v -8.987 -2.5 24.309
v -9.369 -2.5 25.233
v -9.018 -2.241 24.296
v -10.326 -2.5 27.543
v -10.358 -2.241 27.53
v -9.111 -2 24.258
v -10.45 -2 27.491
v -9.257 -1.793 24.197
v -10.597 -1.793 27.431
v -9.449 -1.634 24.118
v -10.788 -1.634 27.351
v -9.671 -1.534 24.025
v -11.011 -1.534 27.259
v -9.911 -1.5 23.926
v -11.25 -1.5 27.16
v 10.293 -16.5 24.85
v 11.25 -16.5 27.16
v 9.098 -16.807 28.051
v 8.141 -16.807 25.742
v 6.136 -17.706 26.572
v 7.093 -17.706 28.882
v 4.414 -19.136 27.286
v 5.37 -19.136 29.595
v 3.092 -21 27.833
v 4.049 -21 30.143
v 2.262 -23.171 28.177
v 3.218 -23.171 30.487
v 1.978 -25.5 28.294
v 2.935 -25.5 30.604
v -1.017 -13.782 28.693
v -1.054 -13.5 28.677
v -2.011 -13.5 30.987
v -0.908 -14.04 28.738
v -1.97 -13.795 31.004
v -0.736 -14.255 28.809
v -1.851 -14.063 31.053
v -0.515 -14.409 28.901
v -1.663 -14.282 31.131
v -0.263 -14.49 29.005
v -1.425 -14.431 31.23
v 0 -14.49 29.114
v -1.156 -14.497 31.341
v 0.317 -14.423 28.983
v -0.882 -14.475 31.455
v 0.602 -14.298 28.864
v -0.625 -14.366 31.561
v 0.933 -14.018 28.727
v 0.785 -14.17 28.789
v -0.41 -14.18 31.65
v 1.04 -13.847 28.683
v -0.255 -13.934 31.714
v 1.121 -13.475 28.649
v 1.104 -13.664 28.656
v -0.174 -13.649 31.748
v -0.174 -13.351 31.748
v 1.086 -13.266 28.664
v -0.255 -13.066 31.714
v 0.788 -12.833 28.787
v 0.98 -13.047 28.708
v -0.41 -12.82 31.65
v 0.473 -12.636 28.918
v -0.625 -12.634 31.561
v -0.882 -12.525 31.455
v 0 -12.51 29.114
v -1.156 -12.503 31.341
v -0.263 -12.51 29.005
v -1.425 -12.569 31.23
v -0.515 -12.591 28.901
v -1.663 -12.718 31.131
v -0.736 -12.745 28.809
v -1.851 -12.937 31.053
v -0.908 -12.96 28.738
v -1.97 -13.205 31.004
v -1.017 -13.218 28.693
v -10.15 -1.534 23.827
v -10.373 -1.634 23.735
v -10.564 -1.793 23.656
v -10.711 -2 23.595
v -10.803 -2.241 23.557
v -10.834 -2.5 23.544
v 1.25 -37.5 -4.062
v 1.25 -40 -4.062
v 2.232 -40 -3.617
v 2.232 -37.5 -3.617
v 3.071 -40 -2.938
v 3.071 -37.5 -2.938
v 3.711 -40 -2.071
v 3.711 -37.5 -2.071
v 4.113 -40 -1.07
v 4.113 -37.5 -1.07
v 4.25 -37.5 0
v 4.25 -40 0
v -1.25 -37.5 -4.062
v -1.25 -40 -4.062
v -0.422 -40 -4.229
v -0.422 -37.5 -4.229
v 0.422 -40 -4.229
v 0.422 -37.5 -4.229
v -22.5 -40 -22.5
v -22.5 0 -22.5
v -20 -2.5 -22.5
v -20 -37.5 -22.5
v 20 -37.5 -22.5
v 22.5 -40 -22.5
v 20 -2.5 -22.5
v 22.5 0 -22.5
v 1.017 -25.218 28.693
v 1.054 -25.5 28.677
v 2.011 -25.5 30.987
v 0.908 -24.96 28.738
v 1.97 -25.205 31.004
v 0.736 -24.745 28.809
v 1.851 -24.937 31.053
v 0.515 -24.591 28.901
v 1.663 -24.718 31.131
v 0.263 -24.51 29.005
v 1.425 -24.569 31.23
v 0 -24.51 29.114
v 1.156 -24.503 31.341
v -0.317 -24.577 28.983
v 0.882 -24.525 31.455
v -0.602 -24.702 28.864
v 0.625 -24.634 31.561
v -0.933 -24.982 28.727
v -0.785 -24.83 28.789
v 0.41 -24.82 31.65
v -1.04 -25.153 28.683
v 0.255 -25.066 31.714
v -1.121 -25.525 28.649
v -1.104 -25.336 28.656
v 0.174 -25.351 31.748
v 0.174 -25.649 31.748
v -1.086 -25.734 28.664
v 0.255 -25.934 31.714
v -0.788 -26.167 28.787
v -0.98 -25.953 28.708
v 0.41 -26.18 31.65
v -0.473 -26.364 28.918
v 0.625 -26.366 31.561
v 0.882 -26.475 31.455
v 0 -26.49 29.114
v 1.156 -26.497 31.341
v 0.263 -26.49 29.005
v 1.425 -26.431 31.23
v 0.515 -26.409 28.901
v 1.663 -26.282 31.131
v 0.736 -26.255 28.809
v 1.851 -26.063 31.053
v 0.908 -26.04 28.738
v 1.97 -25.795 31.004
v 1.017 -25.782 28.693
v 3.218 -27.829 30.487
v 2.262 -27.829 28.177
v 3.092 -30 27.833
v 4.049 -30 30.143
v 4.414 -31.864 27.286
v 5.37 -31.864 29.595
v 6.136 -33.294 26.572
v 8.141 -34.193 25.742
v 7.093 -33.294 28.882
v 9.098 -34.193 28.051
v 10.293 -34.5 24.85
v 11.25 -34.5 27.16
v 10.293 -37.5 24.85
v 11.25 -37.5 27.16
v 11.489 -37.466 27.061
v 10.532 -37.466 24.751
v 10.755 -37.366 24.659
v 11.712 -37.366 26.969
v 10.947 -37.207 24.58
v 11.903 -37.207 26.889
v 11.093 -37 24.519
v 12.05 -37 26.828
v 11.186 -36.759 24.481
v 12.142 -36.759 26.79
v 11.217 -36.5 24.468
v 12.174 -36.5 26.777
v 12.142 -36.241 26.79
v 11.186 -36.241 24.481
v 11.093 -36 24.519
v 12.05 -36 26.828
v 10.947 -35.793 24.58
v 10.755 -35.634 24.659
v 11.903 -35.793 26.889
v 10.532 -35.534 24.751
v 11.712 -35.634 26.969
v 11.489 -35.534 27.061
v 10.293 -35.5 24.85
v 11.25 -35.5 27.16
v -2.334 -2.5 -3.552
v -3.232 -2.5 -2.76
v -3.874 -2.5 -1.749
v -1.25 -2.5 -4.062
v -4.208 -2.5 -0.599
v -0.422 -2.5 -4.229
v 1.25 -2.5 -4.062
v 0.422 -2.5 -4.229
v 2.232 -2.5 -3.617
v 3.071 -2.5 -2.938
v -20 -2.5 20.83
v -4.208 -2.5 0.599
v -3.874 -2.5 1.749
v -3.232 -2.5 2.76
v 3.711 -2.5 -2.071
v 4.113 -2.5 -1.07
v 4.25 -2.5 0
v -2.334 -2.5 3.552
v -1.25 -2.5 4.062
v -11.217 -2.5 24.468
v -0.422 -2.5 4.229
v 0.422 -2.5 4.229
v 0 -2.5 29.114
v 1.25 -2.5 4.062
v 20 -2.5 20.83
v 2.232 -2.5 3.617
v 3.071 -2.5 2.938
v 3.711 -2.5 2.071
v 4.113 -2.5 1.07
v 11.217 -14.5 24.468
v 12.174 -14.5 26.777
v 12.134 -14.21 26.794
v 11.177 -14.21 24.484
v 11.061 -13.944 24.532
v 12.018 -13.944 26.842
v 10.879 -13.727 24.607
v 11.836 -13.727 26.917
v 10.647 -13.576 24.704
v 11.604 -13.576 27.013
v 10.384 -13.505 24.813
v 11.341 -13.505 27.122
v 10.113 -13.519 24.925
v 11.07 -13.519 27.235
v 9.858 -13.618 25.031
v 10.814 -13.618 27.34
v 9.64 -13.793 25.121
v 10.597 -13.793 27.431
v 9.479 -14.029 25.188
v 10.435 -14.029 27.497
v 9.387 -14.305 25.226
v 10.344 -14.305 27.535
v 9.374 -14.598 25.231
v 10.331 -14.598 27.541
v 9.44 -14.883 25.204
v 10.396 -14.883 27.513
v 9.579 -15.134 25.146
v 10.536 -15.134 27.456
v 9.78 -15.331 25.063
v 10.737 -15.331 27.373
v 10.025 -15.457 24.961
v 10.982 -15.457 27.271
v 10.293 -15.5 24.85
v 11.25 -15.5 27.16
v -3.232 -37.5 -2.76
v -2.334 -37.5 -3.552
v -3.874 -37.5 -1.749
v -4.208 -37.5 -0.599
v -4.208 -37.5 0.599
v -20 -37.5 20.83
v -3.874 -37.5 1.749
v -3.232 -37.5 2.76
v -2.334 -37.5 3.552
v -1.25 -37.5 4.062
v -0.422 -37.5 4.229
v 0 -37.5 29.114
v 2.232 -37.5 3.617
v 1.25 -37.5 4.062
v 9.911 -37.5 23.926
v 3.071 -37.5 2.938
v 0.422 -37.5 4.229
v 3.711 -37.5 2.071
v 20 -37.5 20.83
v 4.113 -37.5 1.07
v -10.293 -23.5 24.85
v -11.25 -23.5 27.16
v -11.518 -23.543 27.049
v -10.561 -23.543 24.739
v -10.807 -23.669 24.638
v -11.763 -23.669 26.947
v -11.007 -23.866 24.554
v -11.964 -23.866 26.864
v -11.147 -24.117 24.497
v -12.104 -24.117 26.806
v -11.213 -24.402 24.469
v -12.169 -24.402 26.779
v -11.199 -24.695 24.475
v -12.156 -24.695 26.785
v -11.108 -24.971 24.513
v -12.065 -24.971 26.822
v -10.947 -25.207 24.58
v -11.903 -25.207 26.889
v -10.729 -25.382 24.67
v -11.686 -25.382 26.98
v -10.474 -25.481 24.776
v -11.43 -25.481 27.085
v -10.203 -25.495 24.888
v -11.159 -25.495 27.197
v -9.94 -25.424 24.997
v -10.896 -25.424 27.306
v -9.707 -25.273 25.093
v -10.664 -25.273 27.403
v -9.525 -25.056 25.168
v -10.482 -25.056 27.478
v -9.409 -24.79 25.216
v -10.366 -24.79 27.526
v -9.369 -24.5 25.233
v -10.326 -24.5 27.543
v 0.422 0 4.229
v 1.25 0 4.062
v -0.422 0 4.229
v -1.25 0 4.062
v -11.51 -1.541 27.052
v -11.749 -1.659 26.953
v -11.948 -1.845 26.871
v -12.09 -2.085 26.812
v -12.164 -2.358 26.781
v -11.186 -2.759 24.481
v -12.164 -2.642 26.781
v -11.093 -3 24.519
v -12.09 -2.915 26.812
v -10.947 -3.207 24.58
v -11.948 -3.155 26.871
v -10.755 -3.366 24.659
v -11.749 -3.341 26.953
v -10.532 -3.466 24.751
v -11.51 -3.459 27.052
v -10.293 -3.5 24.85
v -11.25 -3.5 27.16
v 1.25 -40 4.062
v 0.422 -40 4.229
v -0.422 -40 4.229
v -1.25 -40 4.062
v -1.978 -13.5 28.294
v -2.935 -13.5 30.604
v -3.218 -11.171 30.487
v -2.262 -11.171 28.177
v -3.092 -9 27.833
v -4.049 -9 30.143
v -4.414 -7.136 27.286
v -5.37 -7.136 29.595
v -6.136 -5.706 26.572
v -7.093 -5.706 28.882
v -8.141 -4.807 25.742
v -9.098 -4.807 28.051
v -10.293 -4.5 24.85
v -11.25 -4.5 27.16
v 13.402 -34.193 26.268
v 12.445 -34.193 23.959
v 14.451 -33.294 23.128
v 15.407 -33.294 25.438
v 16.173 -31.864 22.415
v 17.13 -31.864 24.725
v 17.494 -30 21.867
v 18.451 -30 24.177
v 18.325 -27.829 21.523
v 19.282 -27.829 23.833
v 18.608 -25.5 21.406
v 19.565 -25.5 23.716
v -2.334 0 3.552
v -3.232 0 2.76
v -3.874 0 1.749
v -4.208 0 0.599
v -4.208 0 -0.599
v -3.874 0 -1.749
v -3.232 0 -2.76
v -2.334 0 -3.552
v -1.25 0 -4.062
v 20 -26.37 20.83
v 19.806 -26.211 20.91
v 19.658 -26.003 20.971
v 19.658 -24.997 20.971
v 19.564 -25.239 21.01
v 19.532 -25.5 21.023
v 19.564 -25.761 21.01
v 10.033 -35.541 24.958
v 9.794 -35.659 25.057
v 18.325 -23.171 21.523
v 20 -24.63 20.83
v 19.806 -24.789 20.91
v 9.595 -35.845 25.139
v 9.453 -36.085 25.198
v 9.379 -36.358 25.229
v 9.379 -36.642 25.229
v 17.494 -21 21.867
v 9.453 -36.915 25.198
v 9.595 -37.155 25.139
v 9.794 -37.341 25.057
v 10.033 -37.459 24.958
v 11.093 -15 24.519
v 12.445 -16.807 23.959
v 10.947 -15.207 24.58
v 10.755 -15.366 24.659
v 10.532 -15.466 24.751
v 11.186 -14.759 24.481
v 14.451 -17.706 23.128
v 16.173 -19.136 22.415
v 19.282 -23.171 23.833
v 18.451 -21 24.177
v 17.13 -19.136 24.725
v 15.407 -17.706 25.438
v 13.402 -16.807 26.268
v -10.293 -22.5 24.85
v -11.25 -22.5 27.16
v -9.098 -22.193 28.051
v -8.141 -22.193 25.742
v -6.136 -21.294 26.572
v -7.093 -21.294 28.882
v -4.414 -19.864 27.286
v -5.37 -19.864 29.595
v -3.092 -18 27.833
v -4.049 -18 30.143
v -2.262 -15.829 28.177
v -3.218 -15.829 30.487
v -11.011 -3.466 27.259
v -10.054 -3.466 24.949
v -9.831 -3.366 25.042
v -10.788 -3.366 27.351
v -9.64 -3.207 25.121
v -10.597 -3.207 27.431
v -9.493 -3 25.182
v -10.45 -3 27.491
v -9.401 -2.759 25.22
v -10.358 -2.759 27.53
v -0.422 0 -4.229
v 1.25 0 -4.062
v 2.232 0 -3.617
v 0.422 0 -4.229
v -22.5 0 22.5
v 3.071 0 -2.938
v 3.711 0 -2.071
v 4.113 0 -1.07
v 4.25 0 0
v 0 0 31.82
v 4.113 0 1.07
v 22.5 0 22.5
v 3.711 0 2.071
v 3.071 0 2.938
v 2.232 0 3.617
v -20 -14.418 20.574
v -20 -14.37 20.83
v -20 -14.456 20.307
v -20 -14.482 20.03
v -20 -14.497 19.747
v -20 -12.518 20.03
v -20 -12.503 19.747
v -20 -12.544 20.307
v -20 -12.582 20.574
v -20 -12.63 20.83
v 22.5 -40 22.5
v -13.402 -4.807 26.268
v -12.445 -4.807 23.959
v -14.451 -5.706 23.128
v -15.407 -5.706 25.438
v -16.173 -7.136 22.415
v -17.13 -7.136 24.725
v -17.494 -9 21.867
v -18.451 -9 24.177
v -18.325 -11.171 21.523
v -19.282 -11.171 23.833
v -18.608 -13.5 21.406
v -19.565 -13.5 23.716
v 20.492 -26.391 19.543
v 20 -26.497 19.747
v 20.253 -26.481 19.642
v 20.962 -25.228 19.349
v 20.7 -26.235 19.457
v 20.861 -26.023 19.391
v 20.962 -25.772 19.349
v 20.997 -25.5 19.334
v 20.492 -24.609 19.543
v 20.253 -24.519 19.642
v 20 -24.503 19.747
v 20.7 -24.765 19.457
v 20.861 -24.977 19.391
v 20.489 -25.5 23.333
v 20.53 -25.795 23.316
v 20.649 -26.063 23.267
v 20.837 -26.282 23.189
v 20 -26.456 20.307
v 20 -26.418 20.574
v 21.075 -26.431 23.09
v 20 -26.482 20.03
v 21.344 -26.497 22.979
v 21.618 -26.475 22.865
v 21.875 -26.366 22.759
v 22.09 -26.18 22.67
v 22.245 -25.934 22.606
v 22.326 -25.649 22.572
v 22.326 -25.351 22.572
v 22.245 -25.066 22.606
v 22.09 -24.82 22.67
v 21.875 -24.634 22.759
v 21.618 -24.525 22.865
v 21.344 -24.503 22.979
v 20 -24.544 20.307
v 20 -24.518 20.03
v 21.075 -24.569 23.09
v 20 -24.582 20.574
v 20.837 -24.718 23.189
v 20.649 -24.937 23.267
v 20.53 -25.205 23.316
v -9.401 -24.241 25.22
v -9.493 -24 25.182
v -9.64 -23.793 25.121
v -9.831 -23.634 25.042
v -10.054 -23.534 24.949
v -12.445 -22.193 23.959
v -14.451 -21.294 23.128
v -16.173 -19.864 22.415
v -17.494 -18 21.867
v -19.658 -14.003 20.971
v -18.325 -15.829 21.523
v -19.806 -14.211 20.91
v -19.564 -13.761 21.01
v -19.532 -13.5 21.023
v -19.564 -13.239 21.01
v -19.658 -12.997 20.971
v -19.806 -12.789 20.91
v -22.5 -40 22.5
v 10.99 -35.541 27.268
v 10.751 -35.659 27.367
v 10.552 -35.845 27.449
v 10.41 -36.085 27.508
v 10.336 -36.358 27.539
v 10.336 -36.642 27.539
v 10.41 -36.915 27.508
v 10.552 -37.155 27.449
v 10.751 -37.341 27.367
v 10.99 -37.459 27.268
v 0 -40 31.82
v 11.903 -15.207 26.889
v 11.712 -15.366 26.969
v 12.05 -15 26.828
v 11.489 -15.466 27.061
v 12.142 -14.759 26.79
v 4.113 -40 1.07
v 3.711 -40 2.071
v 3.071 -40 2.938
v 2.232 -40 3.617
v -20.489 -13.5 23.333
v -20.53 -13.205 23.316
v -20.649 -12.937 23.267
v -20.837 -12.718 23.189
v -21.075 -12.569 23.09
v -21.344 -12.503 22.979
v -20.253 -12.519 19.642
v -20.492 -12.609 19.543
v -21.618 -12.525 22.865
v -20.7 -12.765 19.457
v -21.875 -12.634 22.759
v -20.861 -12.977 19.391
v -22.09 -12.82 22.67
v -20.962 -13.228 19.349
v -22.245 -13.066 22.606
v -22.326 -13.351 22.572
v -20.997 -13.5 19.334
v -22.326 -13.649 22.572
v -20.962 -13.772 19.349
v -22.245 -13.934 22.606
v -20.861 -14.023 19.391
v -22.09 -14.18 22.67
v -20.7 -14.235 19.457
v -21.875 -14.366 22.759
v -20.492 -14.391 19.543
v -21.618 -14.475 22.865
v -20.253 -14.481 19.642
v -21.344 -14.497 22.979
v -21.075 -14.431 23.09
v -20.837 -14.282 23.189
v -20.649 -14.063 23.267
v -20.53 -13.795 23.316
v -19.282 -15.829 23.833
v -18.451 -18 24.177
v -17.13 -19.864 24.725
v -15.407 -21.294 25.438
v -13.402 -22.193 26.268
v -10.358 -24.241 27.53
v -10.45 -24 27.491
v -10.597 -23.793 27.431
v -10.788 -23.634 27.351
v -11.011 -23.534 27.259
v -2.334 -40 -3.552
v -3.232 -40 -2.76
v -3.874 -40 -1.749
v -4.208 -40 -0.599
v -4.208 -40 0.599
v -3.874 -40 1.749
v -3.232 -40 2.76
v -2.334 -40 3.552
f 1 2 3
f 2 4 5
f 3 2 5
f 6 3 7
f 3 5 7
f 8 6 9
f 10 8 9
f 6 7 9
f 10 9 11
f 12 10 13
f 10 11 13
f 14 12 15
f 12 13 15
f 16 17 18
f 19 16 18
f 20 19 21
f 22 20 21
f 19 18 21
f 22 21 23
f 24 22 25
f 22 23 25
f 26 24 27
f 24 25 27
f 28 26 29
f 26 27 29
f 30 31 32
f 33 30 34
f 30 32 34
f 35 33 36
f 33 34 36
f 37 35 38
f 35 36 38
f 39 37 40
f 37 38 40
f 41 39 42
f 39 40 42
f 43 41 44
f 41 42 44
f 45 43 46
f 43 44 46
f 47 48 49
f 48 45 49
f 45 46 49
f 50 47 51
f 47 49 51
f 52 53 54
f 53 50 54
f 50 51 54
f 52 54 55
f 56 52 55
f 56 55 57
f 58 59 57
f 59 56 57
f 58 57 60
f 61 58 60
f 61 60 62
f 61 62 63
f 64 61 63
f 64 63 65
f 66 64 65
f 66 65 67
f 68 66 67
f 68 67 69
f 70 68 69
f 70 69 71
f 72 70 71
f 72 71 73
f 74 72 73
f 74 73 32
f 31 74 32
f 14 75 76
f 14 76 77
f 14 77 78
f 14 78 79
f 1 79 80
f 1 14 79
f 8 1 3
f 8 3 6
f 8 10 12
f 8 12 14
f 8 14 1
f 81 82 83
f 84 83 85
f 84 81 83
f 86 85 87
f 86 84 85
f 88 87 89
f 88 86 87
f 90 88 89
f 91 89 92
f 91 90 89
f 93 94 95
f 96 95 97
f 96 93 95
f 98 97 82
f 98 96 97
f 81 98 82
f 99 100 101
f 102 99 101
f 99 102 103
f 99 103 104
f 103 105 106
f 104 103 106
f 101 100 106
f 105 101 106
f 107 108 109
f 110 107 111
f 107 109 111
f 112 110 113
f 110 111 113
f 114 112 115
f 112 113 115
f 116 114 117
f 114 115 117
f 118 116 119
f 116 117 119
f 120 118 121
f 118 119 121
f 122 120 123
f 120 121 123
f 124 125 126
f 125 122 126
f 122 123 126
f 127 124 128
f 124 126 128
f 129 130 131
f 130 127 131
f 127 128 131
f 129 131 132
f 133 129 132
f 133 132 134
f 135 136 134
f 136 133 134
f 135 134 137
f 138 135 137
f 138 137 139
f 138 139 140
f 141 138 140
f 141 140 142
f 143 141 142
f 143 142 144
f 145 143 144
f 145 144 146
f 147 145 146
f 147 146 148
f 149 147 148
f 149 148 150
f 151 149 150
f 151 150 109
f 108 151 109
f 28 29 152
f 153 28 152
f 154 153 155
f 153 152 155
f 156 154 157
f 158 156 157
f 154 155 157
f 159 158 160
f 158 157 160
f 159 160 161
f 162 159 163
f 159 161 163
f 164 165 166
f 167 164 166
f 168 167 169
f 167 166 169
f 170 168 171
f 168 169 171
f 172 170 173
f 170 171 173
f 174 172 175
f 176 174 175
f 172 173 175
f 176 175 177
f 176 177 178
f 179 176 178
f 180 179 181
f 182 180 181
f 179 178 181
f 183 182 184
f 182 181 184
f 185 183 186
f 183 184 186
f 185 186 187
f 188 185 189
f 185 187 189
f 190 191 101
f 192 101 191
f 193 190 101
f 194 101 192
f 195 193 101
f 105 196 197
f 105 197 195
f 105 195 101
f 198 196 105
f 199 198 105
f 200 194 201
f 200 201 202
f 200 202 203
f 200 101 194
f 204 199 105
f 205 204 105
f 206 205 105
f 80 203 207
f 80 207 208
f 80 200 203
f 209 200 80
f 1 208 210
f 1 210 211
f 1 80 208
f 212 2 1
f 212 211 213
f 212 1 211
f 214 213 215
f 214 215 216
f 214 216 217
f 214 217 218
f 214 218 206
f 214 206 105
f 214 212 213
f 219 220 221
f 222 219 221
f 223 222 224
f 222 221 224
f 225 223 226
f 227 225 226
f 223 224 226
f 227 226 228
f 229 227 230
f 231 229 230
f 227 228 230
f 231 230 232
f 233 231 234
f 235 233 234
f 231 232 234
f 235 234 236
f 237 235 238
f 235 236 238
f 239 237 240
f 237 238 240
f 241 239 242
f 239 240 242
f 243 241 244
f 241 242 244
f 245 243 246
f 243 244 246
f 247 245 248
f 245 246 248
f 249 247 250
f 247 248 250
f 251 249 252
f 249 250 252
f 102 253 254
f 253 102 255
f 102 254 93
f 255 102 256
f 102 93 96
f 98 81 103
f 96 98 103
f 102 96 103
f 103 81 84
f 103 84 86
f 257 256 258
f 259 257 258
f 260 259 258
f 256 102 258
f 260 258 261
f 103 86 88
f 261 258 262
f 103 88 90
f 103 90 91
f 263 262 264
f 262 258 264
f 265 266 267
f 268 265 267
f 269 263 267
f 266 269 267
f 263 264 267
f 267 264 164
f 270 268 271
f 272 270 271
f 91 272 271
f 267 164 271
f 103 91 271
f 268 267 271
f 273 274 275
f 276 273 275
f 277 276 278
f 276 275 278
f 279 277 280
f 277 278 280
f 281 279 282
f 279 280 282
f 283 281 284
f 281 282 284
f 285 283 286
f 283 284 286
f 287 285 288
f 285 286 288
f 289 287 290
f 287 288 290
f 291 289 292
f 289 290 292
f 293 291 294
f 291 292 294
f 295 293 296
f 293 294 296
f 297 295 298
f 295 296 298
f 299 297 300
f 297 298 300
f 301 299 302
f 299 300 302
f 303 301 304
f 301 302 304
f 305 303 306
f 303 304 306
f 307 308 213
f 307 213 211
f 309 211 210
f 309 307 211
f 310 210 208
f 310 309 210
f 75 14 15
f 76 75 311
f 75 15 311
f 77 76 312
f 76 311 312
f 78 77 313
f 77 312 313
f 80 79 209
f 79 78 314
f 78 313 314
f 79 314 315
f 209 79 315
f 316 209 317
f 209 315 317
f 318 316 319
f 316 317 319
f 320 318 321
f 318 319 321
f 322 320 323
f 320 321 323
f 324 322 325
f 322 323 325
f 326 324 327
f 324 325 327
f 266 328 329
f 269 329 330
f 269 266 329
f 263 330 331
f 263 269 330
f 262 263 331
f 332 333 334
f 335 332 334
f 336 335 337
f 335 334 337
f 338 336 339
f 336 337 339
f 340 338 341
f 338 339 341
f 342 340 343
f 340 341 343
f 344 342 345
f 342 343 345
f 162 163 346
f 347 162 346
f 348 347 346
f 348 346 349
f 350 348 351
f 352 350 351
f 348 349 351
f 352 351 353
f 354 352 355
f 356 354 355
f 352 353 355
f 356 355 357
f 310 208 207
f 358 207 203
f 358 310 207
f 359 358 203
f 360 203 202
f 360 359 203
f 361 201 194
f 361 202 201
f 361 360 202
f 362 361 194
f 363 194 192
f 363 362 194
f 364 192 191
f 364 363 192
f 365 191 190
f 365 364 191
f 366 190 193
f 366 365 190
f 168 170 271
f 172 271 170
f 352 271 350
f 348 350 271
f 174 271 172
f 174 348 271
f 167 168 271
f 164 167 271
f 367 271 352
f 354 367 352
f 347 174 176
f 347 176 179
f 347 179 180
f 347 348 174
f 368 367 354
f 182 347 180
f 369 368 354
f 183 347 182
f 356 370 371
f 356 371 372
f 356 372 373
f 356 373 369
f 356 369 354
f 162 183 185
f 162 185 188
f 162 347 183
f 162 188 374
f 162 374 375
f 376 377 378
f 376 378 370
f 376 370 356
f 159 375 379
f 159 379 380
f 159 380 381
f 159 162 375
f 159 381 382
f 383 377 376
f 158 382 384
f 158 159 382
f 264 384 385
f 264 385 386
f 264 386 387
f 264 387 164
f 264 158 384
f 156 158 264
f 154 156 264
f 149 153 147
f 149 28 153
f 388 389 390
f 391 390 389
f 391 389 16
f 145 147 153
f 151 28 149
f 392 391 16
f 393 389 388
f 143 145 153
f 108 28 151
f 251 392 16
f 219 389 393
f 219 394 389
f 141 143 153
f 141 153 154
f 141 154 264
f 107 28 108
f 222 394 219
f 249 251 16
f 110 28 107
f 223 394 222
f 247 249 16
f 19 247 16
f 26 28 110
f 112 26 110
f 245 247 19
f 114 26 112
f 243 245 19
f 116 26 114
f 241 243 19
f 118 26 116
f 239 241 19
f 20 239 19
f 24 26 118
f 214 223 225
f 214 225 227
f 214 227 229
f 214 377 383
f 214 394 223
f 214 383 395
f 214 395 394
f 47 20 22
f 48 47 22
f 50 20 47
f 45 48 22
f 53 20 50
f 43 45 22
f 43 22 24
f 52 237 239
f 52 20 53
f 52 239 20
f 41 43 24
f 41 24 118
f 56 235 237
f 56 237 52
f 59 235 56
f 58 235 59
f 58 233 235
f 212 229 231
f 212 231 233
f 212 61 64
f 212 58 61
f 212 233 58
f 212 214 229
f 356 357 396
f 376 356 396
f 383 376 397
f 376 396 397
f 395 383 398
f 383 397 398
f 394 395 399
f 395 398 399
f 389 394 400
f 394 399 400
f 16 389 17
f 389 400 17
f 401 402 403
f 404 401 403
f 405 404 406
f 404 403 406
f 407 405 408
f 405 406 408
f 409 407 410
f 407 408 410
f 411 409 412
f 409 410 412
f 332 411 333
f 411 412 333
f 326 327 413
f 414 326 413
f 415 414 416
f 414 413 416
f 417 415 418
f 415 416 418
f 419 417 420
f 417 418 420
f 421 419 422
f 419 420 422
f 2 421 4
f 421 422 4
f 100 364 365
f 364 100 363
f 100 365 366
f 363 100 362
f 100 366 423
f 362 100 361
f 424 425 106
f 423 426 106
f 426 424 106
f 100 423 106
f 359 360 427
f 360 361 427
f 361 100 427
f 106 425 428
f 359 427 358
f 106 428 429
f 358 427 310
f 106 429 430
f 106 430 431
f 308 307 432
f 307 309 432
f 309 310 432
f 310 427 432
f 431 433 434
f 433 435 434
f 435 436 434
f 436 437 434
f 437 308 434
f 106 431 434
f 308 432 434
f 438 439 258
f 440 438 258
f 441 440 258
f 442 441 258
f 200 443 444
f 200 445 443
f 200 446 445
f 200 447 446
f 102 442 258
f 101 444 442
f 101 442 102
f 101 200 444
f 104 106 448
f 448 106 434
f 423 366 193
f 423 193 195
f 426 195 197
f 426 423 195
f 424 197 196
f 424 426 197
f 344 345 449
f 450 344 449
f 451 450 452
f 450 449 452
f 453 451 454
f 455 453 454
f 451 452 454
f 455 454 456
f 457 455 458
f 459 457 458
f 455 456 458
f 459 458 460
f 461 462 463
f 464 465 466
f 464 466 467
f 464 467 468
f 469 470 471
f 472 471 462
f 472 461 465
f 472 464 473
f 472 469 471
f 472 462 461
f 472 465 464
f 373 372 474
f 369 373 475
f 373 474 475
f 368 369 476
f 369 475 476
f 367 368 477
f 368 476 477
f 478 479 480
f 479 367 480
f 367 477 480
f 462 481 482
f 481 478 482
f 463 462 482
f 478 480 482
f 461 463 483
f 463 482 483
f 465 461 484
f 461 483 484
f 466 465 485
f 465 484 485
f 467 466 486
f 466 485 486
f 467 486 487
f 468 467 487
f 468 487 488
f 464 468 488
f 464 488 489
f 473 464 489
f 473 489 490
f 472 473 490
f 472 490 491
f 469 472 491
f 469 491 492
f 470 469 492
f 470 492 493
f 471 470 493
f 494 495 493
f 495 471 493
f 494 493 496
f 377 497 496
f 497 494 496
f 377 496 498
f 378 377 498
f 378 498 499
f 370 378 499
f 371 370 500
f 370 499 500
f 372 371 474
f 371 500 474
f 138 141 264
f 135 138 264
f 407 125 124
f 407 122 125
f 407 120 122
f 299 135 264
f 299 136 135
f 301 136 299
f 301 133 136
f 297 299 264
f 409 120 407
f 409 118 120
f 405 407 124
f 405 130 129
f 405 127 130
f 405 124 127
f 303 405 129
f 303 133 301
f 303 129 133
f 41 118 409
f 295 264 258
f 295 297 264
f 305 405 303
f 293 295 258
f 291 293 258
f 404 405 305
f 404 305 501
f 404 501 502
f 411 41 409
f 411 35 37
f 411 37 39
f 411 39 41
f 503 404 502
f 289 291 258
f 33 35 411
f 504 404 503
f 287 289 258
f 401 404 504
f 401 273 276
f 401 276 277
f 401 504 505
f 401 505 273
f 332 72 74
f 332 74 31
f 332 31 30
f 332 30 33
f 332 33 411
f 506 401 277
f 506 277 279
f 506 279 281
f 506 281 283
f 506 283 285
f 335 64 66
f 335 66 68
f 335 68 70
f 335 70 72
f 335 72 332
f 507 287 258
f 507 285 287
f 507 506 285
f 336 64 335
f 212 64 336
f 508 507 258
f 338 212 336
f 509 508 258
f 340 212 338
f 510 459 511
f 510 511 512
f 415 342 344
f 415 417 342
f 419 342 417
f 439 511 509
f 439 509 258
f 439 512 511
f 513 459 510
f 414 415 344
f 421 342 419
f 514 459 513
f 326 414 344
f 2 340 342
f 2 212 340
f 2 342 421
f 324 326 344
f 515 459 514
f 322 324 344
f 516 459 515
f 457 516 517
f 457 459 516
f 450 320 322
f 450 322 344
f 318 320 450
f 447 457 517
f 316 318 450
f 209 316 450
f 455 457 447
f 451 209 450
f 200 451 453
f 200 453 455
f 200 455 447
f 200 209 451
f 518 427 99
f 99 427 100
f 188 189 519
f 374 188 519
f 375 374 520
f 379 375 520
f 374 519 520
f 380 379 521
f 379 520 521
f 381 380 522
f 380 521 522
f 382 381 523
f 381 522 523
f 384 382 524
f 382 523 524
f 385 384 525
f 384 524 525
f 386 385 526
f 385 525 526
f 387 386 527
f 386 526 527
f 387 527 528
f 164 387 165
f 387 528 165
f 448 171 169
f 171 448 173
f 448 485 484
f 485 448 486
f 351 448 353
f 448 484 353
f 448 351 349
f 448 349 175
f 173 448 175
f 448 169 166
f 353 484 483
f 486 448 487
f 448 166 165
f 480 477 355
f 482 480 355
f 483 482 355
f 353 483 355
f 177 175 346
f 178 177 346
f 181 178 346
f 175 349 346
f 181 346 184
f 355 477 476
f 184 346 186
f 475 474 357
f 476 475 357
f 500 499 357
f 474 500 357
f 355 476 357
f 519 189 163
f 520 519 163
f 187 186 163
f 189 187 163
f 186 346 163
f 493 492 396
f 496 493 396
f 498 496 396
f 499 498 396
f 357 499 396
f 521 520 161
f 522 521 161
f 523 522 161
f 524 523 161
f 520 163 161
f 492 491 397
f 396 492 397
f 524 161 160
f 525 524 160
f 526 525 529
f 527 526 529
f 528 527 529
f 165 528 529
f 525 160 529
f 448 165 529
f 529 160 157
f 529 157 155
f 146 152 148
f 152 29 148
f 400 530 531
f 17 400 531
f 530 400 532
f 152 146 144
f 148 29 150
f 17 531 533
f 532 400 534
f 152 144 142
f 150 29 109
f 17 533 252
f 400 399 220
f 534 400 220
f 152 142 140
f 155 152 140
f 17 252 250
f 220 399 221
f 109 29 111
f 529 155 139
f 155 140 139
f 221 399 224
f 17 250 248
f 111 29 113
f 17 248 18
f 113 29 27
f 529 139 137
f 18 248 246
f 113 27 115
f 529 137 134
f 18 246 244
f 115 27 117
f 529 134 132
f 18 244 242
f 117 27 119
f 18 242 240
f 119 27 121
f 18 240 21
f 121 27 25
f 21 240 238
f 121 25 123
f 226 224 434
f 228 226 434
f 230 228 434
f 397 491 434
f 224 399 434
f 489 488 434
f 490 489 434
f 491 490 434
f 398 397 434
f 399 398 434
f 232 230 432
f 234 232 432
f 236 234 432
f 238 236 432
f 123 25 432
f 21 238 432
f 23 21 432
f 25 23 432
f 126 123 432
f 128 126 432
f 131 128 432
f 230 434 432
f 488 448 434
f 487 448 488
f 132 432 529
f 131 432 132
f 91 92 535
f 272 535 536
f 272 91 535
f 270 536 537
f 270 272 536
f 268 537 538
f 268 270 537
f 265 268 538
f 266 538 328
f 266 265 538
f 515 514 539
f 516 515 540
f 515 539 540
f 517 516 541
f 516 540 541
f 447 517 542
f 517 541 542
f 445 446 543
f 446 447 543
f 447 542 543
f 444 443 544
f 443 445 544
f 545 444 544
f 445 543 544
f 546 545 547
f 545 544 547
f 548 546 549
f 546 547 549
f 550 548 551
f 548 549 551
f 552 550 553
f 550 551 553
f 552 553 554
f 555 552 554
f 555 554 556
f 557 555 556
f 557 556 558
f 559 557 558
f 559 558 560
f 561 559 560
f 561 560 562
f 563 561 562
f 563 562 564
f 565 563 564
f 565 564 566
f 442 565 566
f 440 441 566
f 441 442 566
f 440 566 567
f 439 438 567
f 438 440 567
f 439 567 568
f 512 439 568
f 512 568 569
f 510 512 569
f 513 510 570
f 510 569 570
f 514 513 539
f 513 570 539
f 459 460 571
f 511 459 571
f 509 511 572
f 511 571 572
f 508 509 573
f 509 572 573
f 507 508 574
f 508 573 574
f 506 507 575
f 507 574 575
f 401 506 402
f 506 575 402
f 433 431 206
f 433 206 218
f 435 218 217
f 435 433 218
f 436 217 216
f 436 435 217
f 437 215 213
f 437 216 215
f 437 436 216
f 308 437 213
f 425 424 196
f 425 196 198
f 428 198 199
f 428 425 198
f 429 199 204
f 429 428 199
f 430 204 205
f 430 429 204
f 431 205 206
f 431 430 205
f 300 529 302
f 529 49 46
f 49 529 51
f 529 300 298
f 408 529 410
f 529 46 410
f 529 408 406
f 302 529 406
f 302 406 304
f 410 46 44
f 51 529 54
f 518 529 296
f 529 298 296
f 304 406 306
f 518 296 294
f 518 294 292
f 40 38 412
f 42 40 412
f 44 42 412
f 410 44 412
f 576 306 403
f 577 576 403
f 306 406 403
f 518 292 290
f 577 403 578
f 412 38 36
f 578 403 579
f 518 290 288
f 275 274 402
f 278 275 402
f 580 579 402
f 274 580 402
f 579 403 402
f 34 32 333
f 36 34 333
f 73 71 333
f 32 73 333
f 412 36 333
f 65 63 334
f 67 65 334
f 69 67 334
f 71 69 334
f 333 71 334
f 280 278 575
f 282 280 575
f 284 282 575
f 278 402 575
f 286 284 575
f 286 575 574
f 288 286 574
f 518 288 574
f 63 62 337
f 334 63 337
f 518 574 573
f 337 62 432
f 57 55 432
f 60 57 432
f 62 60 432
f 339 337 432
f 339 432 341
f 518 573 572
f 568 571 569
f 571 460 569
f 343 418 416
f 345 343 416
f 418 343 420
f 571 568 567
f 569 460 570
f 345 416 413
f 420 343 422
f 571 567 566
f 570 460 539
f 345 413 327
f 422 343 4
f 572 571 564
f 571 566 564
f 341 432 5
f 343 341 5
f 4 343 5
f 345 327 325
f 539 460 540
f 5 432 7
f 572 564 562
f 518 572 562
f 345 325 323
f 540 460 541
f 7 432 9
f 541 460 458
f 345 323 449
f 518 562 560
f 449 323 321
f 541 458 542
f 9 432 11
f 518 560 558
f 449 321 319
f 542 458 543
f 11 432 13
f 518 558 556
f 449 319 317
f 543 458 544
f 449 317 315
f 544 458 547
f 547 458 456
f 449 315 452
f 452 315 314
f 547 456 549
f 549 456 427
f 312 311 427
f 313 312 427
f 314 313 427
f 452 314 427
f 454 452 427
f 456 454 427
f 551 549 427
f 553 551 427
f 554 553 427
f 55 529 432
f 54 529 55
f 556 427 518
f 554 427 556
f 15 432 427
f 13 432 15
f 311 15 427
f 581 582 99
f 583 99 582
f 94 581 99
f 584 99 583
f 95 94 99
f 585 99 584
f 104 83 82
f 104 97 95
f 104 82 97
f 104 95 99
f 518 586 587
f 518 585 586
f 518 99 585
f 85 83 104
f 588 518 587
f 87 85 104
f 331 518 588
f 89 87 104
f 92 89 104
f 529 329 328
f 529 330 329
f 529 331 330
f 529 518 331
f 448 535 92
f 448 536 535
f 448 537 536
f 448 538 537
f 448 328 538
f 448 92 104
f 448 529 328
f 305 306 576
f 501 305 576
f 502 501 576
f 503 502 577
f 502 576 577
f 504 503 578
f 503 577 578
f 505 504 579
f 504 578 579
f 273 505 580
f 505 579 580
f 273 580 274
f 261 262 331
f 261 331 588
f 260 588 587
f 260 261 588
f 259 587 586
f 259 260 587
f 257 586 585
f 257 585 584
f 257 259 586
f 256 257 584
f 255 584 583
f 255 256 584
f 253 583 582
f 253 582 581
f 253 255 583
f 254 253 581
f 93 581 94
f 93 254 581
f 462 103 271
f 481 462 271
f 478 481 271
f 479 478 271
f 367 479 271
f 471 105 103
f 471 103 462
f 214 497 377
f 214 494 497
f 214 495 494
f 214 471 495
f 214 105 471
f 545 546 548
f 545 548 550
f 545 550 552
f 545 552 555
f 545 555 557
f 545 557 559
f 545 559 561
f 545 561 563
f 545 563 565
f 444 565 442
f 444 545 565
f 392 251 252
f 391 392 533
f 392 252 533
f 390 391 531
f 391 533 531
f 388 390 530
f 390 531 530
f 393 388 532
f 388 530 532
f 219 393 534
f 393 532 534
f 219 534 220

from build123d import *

# Parameters (mm, degrees)
F0_W     = 2.5
F0_H     = 40
F0_H_2   = 2.5
F1_DEPTH = 40
F2_T     = -2.5
F3_DEPTH = 40
F5_R     = 1
F6_DEPTH = 3.5
F4_R     = 1
F7_DEPTH = 3.5


with BuildPart() as f1:
    # F0 (on Front) → F1 (new body)
    with BuildSketch(Plane.XZ):
        Polygon((20, 20), (20, 22.5), (-22.5, 22.5), (-22.5, -22.5), (20, -22.5), (20, -20), (17.5, -20), (17.5, 20), align=None)
        with Locations((-18.75, 0)):
            Rectangle(F0_W, F0_H, mode=Mode.SUBTRACT)
        with Locations((-12.5, 0)):
            Rectangle(F0_W, F0_H, mode=Mode.SUBTRACT)
        with BuildLine():
            Line((1.25, 20), (1.25, 6.6332495807))
            ThreePointArc((1.25, 6.6332495807), (3.2964706517, 5.8903124911), (5, 4.5345892868))
            Line((5, 4.5345892868), (5, 20))
            Line((5, 20), (7.5, 20))
            Line((7.5, 20), (7.5, -20))
            Line((7.5, -20), (5, -20))
            Line((5, -20), (5, -4.5345892868))
            ThreePointArc((5, -4.5345892868), (3.2964706517, -5.8903124911), (1.25, -6.6332495807))
            Line((1.25, -6.6332495807), (1.25, -20))
            Line((1.25, -20), (-1.25, -20))
            Line((-1.25, -20), (-1.25, -6.6332495807))
            ThreePointArc((-1.25, -6.6332495807), (-3.2964706517, -5.8903124911), (-5, -4.5345892868))
            Line((-5, -4.5345892868), (-5, -20))
            Line((-5, -20), (-7.5, -20))
            Line((-7.5, -20), (-7.5, 20))
            Line((-7.5, 20), (-5, 20))
            Line((-5, 20), (-5, 4.5345892868))
            ThreePointArc((-5, 4.5345892868), (-3.2964706517, 5.8903124911), (-1.25, 6.6332495807))
            Line((-1.25, 6.6332495807), (-1.25, 20))
            Line((-1.25, 20), (1.25, 20))
        make_face(mode=Mode.SUBTRACT)
        with Locations((12.5, 0)):
            Rectangle(F0_W, F0_H, mode=Mode.SUBTRACT)
        Polygon((20, 22.5), (22.5, 22.5), (0, 31.8198051534), (-22.5, 22.5), align=None)
        with Locations((-12.5, 0)):
            Rectangle(F0_W, F0_H)
        with Locations((18.75, 0)):
            Rectangle(F0_W, F0_H)
        with Locations((-18.75, 0)):
            Rectangle(F0_W, F0_H)
        with Locations((21.25, 0)):
            Rectangle(F0_W, F0_H)
        with Locations((12.5, 0)):
            Rectangle(F0_W, F0_H)
        with BuildLine():
            Line((5, 20), (5, 4.5345892868))
            ThreePointArc((5, 4.5345892868), (6.2973208589, 2.4302777619), (6.75, 0))
            ThreePointArc((6.75, 0), (6.2973208589, -2.4302777619), (5, -4.5345892868))
            Line((5, -4.5345892868), (5, -20))
            Line((5, -20), (7.5, -20))
            Line((7.5, -20), (7.5, 20))
            Line((7.5, 20), (5, 20))
        make_face()
        with BuildLine():
            ThreePointArc((-5, -4.5345892868), (-6.75, 0), (-5, 4.5345892868))
            Line((-5, 4.5345892868), (-5, 20))
            Line((-5, 20), (-7.5, 20))
            Line((-7.5, 20), (-7.5, -20))
            Line((-7.5, -20), (-5, -20))
            Line((-5, -20), (-5, -4.5345892868))
        make_face()
        with BuildLine():
            ThreePointArc((-1.25, 6.6332495807), (0, 6.75), (1.25, 6.6332495807))
            Line((1.25, 6.6332495807), (1.25, 20))
            Line((1.25, 20), (-1.25, 20))
            Line((-1.25, 20), (-1.25, 6.6332495807))
        make_face()
        with BuildLine():
            Line((1.25, -20), (1.25, -6.6332495807))
            ThreePointArc((1.25, -6.6332495807), (0, -6.75), (-1.25, -6.6332495807))
            Line((-1.25, -6.6332495807), (-1.25, -20))
            Line((-1.25, -20), (1.25, -20))
        make_face()
        with BuildLine():
            ThreePointArc((-1.25, -4.0620192023), (-4.25, 0), (-1.25, 4.0620192023))
            Line((-1.25, 4.0620192023), (-1.25, 6.6332495807))
            ThreePointArc((-1.25, 6.6332495807), (-3.2964706517, 5.8903124911), (-5, 4.5345892868))
            Line((-5, 4.5345892868), (-5, -4.5345892868))
            ThreePointArc((-5, -4.5345892868), (-3.2964706517, -5.8903124911), (-1.25, -6.6332495807))
            Line((-1.25, -6.6332495807), (-1.25, -4.0620192023))
        make_face()
        with BuildLine():
            ThreePointArc((1.25, 4.0620192023), (3.4186985828, 2.5248762346), (4.25, 0))
            ThreePointArc((4.25, 0), (3.4186985828, -2.5248762346), (1.25, -4.0620192023))
            Line((1.25, -4.0620192023), (1.25, -6.6332495807))
            ThreePointArc((1.25, -6.6332495807), (3.2964706517, -5.8903124911), (5, -4.5345892868))
            Line((5, -4.5345892868), (5, 4.5345892868))
            ThreePointArc((5, 4.5345892868), (3.2964706517, 5.8903124911), (1.25, 6.6332495807))
            Line((1.25, 6.6332495807), (1.25, 4.0620192023))
        make_face()
        with BuildLine():
            Line((1.25, -4.0620192023), (1.25, 4.0620192023))
            ThreePointArc((1.25, 4.0620192023), (0, 4.25), (-1.25, 4.0620192023))
            Line((-1.25, 4.0620192023), (-1.25, -4.0620192023))
            ThreePointArc((-1.25, -4.0620192023), (0, -4.25), (1.25, -4.0620192023))
        make_face()
        with BuildLine():
            Line((-1.25, -4.0620192023), (-1.25, 4.0620192023))
            ThreePointArc((-1.25, 4.0620192023), (-4.25, 0), (-1.25, -4.0620192023))
        make_face()
        with BuildLine():
            ThreePointArc((1.25, -4.0620192023), (3.4186985828, -2.5248762346), (4.25, 0))
            ThreePointArc((4.25, 0), (3.4186985828, 2.5248762346), (1.25, 4.0620192023))
            Line((1.25, 4.0620192023), (1.25, -4.0620192023))
        make_face()
        with BuildLine():
            ThreePointArc((6.75, 0), (6.2973208589, 2.4302777619), (5, 4.5345892868))
            Line((5, 4.5345892868), (5, -4.5345892868))
            ThreePointArc((5, -4.5345892868), (6.2973208589, -2.4302777619), (6.75, 0))
        make_face()
        with BuildLine():
            Line((-5, -4.5345892868), (-5, 4.5345892868))
            ThreePointArc((-5, 4.5345892868), (-6.75, 0), (-5, -4.5345892868))
        make_face()
        with BuildLine():
            Line((1.25, -6.6332495807), (1.25, -4.0620192023))
            ThreePointArc((1.25, -4.0620192023), (0, -4.25), (-1.25, -4.0620192023))
            Line((-1.25, -4.0620192023), (-1.25, -6.6332495807))
            ThreePointArc((-1.25, -6.6332495807), (0, -6.75), (1.25, -6.6332495807))
        make_face()
        with BuildLine():
            ThreePointArc((-1.25, 4.0620192023), (0, 4.25), (1.25, 4.0620192023))
            Line((1.25, 4.0620192023), (1.25, 6.6332495807))
            ThreePointArc((1.25, 6.6332495807), (0, 6.75), (-1.25, 6.6332495807))
            Line((-1.25, 6.6332495807), (-1.25, 4.0620192023))
        make_face()
        with Locations((21.25, -21.25)):
            Rectangle(F0_W, F0_H_2)
        with Locations((21.25, 21.25)):
            Rectangle(F0_W, F0_H_2)
    extrude(amount=F1_DEPTH)

    # F2
    f2_openings = [f1.faces().sort_by_distance(p)[0] for p in [
        (0, -20, -22.5),
    ]]
    offset(amount=F2_T, openings=f2_openings)

    # F0 (on Front) → F3 (cut)
    with BuildSketch(Plane.XZ):
        with BuildLine():
            ThreePointArc((1.25, -4.0620192023), (3.4186985828, -2.5248762346), (4.25, 0))
            ThreePointArc((4.25, 0), (3.4186985828, 2.5248762346), (1.25, 4.0620192023))
            Line((1.25, 4.0620192023), (1.25, -4.0620192023))
        make_face()
        with BuildLine():
            Line((1.25, -4.0620192023), (1.25, 4.0620192023))
            ThreePointArc((1.25, 4.0620192023), (0, 4.25), (-1.25, 4.0620192023))
            Line((-1.25, 4.0620192023), (-1.25, -4.0620192023))
            ThreePointArc((-1.25, -4.0620192023), (0, -4.25), (1.25, -4.0620192023))
        make_face()
        with BuildLine():
            Line((-1.25, -4.0620192023), (-1.25, 4.0620192023))
            ThreePointArc((-1.25, 4.0620192023), (-4.25, 0), (-1.25, -4.0620192023))
        make_face()
    extrude(amount=F3_DEPTH, mode=Mode.SUBTRACT)

    # F5 (on face) → F6 (cut)
    with BuildSketch(Plane(origin=(11.25, 0, 27.1599025767), x_dir=(0.9238795325, 0, -0.3826834324), z_dir=(0.3826834324, 0, 0.9238795325))):
        with BuildLine():
            Line((0, -16.5), (0, -25.5))
            Line((0, -25.5), (9, -25.5))
            ThreePointArc((9, -25.5), (6.3639610307, -19.1360389693), (0, -16.5))
        make_face()
        with BuildLine():
            Line((-9, -25.5), (0, -25.5))
            Line((0, -25.5), (0, -16.5))
            ThreePointArc((0, -16.5), (-6.3639610307, -19.1360389693), (-9, -25.5))
        make_face()
        with BuildLine():
            ThreePointArc((-9, -25.5), (-6.3639610307, -31.8639610307), (0, -34.5))
            Line((0, -34.5), (0, -25.5))
            Line((0, -25.5), (-9, -25.5))
        make_face()
        with BuildLine():
            Line((0, -25.5), (0, -34.5))
            ThreePointArc((0, -34.5), (6.3639610307, -31.8639610307), (9, -25.5))
            Line((9, -25.5), (0, -25.5))
        make_face()
        with Locations((-11, -25.5)):
            Circle(F5_R)
        with BuildLine():
            ThreePointArc((1, -14.5), (-0.7071067812, -13.7928932188), (0, -15.5))
            ThreePointArc((0, -15.5), (0.7071067812, -15.2071067812), (1, -14.5))
        make_face()
        with BuildLine():
            ThreePointArc((12, -25.5), (11, -24.5), (10, -25.5))
            ThreePointArc((10, -25.5), (11, -26.5), (12, -25.5))
        make_face()
        with BuildLine():
            Line((0, -36.5), (0, -37.5))
            ThreePointArc((0, -37.5), (0.7071067812, -37.2071067812), (1, -36.5))
            ThreePointArc((1, -36.5), (0.7071067812, -35.7928932188), (0, -35.5))
            Line((0, -35.5), (0, -36.5))
        make_face()
        with BuildLine():
            ThreePointArc((0, -35.5), (-1, -36.5), (0, -37.5))
            Line((0, -37.5), (0, -36.5))
            Line((0, -36.5), (0, -35.5))
        make_face()
    extrude(amount=-F6_DEPTH, mode=Mode.SUBTRACT)

    # F4 (on face) → F7 (cut)
    with BuildSketch(Plane(origin=(-11.25, 0, 27.1599025767), x_dir=(0.9238795325, 0, 0.3826834324), z_dir=(-0.3826834324, 0, 0.9238795325))):
        with BuildLine():
            ThreePointArc((9, -13.5), (6.3639610307, -7.1360389693), (0, -4.5))
            Line((0, -4.5), (0, -13.5))
            Line((0, -13.5), (9, -13.5))
        make_face()
        with BuildLine():
            Line((0, -13.5), (0, -4.5))
            ThreePointArc((0, -4.5), (-6.3639610307, -7.1360389693), (-9, -13.5))
            Line((-9, -13.5), (0, -13.5))
        make_face()
        with BuildLine():
            Line((0, -22.5), (0, -13.5))
            Line((0, -13.5), (-9, -13.5))
            ThreePointArc((-9, -13.5), (-6.3639610307, -19.8639610307), (0, -22.5))
        make_face()
        with BuildLine():
            Line((9, -13.5), (0, -13.5))
            Line((0, -13.5), (0, -22.5))
            ThreePointArc((0, -22.5), (6.3639610307, -19.8639610307), (9, -13.5))
        make_face()
        with BuildLine():
            ThreePointArc((1, -2.5), (0.7071067812, -1.7928932188), (0, -1.5))
            Line((0, -1.5), (0, -2.5))
            Line((0, -2.5), (0, -3.5))
            ThreePointArc((0, -3.5), (0.7071067812, -3.2071067812), (1, -2.5))
        make_face()
        with BuildLine():
            Line((0, -2.5), (0, -1.5))
            ThreePointArc((0, -1.5), (-1, -2.5), (0, -3.5))
            Line((0, -3.5), (0, -2.5))
        make_face()
        with Locations((-11, -13.5)):
            Circle(F4_R)
        with BuildLine():
            ThreePointArc((1, -24.5), (0.7071067812, -23.7928932188), (0, -23.5))
            ThreePointArc((0, -23.5), (-0.7071067812, -25.2071067812), (1, -24.5))
        make_face()
        with BuildLine():
            ThreePointArc((12, -13.5), (11, -12.5), (10, -13.5))
            ThreePointArc((10, -13.5), (11, -14.5), (12, -13.5))
        make_face()
    extrude(amount=-F7_DEPTH, mode=Mode.SUBTRACT)


solid = f1.part
